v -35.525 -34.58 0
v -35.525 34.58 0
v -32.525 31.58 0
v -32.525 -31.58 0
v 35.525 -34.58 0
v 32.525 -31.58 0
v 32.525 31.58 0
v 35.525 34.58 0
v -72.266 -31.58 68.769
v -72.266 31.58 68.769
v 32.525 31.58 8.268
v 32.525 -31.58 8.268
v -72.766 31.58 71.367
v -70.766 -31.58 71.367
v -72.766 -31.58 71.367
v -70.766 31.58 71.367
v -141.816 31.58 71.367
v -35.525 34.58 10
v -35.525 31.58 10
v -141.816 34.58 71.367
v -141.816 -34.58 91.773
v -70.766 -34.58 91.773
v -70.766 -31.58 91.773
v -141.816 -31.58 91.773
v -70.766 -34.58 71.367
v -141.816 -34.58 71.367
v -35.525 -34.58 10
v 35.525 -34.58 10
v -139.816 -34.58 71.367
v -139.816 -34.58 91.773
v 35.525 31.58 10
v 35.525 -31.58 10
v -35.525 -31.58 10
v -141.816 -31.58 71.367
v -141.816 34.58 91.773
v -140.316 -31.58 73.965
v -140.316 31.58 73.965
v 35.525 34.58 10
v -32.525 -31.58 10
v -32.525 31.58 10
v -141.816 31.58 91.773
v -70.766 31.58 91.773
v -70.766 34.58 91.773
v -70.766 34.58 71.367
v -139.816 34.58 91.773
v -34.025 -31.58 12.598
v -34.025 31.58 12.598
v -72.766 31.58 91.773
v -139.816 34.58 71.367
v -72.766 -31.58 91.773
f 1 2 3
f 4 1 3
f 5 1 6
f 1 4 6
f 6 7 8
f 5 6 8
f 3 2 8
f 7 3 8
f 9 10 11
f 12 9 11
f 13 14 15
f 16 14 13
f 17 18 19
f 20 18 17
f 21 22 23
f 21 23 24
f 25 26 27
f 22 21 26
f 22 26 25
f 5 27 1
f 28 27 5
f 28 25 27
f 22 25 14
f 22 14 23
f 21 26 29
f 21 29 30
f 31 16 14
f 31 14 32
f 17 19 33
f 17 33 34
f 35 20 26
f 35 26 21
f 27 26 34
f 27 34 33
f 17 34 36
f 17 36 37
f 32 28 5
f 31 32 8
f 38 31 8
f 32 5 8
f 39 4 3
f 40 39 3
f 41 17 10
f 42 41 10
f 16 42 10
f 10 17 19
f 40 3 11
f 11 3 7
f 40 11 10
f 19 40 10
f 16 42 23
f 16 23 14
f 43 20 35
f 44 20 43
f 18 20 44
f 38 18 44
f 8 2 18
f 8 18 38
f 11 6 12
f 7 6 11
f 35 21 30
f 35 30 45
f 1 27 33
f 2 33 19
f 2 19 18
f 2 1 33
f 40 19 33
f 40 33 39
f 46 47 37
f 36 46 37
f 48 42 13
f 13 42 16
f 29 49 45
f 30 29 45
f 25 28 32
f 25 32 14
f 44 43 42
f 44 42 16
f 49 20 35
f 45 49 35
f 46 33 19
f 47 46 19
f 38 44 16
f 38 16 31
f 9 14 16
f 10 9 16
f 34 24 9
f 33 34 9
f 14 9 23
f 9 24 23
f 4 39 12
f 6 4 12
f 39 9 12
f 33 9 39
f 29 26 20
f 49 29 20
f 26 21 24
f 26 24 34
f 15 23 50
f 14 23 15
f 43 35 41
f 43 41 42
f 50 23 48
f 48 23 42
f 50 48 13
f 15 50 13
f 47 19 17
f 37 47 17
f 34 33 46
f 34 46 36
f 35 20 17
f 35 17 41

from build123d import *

# Parameters (mm, degrees)
SKETCH1_W            = 71.049193282
SKETCH1_H            = 69.159838322
SKETCH1_W_2          = 65.049193282
SKETCH1_H_2          = 63.159838322
BOSS_EXTRUDE1_DEPTH  = 10
BOSS_EXTRUDE2_DEPTH  = 3
BOSS_EXTRUDE3_DEPTH  = 3
SKETCH4_W            = 122.733728081
SKETCH4_H            = 69.159838322
BOSS_EXTRUDE5_DEPTH  = 3
SKETCH5_W            = 122.734426718
SKETCH5_H            = 63.159838322
BOSS_EXTRUDE14_DEPTH = 3
SKETCH6_W            = 20.406171659
SKETCH6_H            = 63.159838322
BASE_FLANGE1_DEPTH   = 2
SKETCH11_W           = 20.40582234
SKETCH11_H           = 69.159838322
BASE_FLANGE2_DEPTH   = 2


# Sheet-metal steps are written as plain solids
with BuildPart() as part:
    # Sketch1 → Boss-Extrude1 (new body)
    with BuildSketch(Plane.XY):
        Rectangle(SKETCH1_W, SKETCH1_H)
        Rectangle(SKETCH1_W_2, SKETCH1_H_2, mode=Mode.SUBTRACT)
    extrude(amount=BOSS_EXTRUDE1_DEPTH)

    # Sketch2 → Boss-Extrude2 (add)
    with BuildSketch(Plane.XZ.offset(34.579919161)):
        Polygon((35.524596641, 10), (-70.765929778, 71.36686404), (-70.765929778, 91.773035699), (-141.815929778, 91.773035699), (-141.815728099, 71.367213359), (-35.524596641, 10), align=None)
    extrude(amount=-BOSS_EXTRUDE2_DEPTH)

    # Sketch3 → Boss-Extrude3 (add)
    with BuildSketch(Plane(origin=(0, 34.579919161, 0), x_dir=(1, 0, 0), z_dir=(0, 1, 0))):
        Polygon((-35.524596641, -10), (-141.815728099, -71.367213359), (-141.815929778, -91.773035699), (-70.765929778, -91.773035699), (-70.765929778, -71.36686404), (35.524596641, -10), align=None)
    extrude(amount=-BOSS_EXTRUDE3_DEPTH)

    # Sketch4 → Boss-Extrude5 (add)
    with BuildSketch(Plane(origin=(13.211276179, 0, 22.882601575), x_dir=(0.8660254037844416, 0, -0.499999999999995), z_dir=(0.49999999999999495, 0, 0.8660254037844415))):
        with Locations((-35.601660889, 0)):
            Rectangle(SKETCH4_W, SKETCH4_H)
    extrude(amount=-BOSS_EXTRUDE5_DEPTH)


with BuildPart() as body_2:
    # Sketch5 → Boss-Extrude14 (new body)
    with BuildSketch(Plane(origin=(-4.551022141, 0, -7.882601575), x_dir=(-0.8660254037844417, 0, 0.49999999999999467), z_dir=(-0.49999999999999467, 0, -0.8660254037844417))):
        with Locations((97.13241651, 0)):
            Rectangle(SKETCH5_W, SKETCH5_H)
    extrude(amount=-BOSS_EXTRUDE14_DEPTH)


with BuildPart() as body_3:
    # Sketch6 → Base-Flange1 (new body)
    with BuildSketch(Plane(origin=(-70.765929778, 0, 0), x_dir=(0, 0, -1), z_dir=(1, 0, 0))):
        with Locations((-81.56994987, 0)):
            Rectangle(SKETCH6_W, SKETCH6_H)
    extrude(amount=-BASE_FLANGE1_DEPTH)


with BuildPart() as body_4:
    # Sketch11 → Base-Flange2 (new body)
    with BuildSketch(Plane(origin=(-141.815022732, 0, -0.001401618), x_dir=(-9.883423150445956e-06, 0, 0.9999999999511591), z_dir=(-0.9999999999511591, 0, -9.883423150445956e-06))):
        with Locations((81.571526151, 0)):
            Rectangle(SKETCH11_W, SKETCH11_H)
    extrude(amount=-BASE_FLANGE2_DEPTH)


solid = Compound([part.part, body_2.part, body_3.part, body_4.part])
